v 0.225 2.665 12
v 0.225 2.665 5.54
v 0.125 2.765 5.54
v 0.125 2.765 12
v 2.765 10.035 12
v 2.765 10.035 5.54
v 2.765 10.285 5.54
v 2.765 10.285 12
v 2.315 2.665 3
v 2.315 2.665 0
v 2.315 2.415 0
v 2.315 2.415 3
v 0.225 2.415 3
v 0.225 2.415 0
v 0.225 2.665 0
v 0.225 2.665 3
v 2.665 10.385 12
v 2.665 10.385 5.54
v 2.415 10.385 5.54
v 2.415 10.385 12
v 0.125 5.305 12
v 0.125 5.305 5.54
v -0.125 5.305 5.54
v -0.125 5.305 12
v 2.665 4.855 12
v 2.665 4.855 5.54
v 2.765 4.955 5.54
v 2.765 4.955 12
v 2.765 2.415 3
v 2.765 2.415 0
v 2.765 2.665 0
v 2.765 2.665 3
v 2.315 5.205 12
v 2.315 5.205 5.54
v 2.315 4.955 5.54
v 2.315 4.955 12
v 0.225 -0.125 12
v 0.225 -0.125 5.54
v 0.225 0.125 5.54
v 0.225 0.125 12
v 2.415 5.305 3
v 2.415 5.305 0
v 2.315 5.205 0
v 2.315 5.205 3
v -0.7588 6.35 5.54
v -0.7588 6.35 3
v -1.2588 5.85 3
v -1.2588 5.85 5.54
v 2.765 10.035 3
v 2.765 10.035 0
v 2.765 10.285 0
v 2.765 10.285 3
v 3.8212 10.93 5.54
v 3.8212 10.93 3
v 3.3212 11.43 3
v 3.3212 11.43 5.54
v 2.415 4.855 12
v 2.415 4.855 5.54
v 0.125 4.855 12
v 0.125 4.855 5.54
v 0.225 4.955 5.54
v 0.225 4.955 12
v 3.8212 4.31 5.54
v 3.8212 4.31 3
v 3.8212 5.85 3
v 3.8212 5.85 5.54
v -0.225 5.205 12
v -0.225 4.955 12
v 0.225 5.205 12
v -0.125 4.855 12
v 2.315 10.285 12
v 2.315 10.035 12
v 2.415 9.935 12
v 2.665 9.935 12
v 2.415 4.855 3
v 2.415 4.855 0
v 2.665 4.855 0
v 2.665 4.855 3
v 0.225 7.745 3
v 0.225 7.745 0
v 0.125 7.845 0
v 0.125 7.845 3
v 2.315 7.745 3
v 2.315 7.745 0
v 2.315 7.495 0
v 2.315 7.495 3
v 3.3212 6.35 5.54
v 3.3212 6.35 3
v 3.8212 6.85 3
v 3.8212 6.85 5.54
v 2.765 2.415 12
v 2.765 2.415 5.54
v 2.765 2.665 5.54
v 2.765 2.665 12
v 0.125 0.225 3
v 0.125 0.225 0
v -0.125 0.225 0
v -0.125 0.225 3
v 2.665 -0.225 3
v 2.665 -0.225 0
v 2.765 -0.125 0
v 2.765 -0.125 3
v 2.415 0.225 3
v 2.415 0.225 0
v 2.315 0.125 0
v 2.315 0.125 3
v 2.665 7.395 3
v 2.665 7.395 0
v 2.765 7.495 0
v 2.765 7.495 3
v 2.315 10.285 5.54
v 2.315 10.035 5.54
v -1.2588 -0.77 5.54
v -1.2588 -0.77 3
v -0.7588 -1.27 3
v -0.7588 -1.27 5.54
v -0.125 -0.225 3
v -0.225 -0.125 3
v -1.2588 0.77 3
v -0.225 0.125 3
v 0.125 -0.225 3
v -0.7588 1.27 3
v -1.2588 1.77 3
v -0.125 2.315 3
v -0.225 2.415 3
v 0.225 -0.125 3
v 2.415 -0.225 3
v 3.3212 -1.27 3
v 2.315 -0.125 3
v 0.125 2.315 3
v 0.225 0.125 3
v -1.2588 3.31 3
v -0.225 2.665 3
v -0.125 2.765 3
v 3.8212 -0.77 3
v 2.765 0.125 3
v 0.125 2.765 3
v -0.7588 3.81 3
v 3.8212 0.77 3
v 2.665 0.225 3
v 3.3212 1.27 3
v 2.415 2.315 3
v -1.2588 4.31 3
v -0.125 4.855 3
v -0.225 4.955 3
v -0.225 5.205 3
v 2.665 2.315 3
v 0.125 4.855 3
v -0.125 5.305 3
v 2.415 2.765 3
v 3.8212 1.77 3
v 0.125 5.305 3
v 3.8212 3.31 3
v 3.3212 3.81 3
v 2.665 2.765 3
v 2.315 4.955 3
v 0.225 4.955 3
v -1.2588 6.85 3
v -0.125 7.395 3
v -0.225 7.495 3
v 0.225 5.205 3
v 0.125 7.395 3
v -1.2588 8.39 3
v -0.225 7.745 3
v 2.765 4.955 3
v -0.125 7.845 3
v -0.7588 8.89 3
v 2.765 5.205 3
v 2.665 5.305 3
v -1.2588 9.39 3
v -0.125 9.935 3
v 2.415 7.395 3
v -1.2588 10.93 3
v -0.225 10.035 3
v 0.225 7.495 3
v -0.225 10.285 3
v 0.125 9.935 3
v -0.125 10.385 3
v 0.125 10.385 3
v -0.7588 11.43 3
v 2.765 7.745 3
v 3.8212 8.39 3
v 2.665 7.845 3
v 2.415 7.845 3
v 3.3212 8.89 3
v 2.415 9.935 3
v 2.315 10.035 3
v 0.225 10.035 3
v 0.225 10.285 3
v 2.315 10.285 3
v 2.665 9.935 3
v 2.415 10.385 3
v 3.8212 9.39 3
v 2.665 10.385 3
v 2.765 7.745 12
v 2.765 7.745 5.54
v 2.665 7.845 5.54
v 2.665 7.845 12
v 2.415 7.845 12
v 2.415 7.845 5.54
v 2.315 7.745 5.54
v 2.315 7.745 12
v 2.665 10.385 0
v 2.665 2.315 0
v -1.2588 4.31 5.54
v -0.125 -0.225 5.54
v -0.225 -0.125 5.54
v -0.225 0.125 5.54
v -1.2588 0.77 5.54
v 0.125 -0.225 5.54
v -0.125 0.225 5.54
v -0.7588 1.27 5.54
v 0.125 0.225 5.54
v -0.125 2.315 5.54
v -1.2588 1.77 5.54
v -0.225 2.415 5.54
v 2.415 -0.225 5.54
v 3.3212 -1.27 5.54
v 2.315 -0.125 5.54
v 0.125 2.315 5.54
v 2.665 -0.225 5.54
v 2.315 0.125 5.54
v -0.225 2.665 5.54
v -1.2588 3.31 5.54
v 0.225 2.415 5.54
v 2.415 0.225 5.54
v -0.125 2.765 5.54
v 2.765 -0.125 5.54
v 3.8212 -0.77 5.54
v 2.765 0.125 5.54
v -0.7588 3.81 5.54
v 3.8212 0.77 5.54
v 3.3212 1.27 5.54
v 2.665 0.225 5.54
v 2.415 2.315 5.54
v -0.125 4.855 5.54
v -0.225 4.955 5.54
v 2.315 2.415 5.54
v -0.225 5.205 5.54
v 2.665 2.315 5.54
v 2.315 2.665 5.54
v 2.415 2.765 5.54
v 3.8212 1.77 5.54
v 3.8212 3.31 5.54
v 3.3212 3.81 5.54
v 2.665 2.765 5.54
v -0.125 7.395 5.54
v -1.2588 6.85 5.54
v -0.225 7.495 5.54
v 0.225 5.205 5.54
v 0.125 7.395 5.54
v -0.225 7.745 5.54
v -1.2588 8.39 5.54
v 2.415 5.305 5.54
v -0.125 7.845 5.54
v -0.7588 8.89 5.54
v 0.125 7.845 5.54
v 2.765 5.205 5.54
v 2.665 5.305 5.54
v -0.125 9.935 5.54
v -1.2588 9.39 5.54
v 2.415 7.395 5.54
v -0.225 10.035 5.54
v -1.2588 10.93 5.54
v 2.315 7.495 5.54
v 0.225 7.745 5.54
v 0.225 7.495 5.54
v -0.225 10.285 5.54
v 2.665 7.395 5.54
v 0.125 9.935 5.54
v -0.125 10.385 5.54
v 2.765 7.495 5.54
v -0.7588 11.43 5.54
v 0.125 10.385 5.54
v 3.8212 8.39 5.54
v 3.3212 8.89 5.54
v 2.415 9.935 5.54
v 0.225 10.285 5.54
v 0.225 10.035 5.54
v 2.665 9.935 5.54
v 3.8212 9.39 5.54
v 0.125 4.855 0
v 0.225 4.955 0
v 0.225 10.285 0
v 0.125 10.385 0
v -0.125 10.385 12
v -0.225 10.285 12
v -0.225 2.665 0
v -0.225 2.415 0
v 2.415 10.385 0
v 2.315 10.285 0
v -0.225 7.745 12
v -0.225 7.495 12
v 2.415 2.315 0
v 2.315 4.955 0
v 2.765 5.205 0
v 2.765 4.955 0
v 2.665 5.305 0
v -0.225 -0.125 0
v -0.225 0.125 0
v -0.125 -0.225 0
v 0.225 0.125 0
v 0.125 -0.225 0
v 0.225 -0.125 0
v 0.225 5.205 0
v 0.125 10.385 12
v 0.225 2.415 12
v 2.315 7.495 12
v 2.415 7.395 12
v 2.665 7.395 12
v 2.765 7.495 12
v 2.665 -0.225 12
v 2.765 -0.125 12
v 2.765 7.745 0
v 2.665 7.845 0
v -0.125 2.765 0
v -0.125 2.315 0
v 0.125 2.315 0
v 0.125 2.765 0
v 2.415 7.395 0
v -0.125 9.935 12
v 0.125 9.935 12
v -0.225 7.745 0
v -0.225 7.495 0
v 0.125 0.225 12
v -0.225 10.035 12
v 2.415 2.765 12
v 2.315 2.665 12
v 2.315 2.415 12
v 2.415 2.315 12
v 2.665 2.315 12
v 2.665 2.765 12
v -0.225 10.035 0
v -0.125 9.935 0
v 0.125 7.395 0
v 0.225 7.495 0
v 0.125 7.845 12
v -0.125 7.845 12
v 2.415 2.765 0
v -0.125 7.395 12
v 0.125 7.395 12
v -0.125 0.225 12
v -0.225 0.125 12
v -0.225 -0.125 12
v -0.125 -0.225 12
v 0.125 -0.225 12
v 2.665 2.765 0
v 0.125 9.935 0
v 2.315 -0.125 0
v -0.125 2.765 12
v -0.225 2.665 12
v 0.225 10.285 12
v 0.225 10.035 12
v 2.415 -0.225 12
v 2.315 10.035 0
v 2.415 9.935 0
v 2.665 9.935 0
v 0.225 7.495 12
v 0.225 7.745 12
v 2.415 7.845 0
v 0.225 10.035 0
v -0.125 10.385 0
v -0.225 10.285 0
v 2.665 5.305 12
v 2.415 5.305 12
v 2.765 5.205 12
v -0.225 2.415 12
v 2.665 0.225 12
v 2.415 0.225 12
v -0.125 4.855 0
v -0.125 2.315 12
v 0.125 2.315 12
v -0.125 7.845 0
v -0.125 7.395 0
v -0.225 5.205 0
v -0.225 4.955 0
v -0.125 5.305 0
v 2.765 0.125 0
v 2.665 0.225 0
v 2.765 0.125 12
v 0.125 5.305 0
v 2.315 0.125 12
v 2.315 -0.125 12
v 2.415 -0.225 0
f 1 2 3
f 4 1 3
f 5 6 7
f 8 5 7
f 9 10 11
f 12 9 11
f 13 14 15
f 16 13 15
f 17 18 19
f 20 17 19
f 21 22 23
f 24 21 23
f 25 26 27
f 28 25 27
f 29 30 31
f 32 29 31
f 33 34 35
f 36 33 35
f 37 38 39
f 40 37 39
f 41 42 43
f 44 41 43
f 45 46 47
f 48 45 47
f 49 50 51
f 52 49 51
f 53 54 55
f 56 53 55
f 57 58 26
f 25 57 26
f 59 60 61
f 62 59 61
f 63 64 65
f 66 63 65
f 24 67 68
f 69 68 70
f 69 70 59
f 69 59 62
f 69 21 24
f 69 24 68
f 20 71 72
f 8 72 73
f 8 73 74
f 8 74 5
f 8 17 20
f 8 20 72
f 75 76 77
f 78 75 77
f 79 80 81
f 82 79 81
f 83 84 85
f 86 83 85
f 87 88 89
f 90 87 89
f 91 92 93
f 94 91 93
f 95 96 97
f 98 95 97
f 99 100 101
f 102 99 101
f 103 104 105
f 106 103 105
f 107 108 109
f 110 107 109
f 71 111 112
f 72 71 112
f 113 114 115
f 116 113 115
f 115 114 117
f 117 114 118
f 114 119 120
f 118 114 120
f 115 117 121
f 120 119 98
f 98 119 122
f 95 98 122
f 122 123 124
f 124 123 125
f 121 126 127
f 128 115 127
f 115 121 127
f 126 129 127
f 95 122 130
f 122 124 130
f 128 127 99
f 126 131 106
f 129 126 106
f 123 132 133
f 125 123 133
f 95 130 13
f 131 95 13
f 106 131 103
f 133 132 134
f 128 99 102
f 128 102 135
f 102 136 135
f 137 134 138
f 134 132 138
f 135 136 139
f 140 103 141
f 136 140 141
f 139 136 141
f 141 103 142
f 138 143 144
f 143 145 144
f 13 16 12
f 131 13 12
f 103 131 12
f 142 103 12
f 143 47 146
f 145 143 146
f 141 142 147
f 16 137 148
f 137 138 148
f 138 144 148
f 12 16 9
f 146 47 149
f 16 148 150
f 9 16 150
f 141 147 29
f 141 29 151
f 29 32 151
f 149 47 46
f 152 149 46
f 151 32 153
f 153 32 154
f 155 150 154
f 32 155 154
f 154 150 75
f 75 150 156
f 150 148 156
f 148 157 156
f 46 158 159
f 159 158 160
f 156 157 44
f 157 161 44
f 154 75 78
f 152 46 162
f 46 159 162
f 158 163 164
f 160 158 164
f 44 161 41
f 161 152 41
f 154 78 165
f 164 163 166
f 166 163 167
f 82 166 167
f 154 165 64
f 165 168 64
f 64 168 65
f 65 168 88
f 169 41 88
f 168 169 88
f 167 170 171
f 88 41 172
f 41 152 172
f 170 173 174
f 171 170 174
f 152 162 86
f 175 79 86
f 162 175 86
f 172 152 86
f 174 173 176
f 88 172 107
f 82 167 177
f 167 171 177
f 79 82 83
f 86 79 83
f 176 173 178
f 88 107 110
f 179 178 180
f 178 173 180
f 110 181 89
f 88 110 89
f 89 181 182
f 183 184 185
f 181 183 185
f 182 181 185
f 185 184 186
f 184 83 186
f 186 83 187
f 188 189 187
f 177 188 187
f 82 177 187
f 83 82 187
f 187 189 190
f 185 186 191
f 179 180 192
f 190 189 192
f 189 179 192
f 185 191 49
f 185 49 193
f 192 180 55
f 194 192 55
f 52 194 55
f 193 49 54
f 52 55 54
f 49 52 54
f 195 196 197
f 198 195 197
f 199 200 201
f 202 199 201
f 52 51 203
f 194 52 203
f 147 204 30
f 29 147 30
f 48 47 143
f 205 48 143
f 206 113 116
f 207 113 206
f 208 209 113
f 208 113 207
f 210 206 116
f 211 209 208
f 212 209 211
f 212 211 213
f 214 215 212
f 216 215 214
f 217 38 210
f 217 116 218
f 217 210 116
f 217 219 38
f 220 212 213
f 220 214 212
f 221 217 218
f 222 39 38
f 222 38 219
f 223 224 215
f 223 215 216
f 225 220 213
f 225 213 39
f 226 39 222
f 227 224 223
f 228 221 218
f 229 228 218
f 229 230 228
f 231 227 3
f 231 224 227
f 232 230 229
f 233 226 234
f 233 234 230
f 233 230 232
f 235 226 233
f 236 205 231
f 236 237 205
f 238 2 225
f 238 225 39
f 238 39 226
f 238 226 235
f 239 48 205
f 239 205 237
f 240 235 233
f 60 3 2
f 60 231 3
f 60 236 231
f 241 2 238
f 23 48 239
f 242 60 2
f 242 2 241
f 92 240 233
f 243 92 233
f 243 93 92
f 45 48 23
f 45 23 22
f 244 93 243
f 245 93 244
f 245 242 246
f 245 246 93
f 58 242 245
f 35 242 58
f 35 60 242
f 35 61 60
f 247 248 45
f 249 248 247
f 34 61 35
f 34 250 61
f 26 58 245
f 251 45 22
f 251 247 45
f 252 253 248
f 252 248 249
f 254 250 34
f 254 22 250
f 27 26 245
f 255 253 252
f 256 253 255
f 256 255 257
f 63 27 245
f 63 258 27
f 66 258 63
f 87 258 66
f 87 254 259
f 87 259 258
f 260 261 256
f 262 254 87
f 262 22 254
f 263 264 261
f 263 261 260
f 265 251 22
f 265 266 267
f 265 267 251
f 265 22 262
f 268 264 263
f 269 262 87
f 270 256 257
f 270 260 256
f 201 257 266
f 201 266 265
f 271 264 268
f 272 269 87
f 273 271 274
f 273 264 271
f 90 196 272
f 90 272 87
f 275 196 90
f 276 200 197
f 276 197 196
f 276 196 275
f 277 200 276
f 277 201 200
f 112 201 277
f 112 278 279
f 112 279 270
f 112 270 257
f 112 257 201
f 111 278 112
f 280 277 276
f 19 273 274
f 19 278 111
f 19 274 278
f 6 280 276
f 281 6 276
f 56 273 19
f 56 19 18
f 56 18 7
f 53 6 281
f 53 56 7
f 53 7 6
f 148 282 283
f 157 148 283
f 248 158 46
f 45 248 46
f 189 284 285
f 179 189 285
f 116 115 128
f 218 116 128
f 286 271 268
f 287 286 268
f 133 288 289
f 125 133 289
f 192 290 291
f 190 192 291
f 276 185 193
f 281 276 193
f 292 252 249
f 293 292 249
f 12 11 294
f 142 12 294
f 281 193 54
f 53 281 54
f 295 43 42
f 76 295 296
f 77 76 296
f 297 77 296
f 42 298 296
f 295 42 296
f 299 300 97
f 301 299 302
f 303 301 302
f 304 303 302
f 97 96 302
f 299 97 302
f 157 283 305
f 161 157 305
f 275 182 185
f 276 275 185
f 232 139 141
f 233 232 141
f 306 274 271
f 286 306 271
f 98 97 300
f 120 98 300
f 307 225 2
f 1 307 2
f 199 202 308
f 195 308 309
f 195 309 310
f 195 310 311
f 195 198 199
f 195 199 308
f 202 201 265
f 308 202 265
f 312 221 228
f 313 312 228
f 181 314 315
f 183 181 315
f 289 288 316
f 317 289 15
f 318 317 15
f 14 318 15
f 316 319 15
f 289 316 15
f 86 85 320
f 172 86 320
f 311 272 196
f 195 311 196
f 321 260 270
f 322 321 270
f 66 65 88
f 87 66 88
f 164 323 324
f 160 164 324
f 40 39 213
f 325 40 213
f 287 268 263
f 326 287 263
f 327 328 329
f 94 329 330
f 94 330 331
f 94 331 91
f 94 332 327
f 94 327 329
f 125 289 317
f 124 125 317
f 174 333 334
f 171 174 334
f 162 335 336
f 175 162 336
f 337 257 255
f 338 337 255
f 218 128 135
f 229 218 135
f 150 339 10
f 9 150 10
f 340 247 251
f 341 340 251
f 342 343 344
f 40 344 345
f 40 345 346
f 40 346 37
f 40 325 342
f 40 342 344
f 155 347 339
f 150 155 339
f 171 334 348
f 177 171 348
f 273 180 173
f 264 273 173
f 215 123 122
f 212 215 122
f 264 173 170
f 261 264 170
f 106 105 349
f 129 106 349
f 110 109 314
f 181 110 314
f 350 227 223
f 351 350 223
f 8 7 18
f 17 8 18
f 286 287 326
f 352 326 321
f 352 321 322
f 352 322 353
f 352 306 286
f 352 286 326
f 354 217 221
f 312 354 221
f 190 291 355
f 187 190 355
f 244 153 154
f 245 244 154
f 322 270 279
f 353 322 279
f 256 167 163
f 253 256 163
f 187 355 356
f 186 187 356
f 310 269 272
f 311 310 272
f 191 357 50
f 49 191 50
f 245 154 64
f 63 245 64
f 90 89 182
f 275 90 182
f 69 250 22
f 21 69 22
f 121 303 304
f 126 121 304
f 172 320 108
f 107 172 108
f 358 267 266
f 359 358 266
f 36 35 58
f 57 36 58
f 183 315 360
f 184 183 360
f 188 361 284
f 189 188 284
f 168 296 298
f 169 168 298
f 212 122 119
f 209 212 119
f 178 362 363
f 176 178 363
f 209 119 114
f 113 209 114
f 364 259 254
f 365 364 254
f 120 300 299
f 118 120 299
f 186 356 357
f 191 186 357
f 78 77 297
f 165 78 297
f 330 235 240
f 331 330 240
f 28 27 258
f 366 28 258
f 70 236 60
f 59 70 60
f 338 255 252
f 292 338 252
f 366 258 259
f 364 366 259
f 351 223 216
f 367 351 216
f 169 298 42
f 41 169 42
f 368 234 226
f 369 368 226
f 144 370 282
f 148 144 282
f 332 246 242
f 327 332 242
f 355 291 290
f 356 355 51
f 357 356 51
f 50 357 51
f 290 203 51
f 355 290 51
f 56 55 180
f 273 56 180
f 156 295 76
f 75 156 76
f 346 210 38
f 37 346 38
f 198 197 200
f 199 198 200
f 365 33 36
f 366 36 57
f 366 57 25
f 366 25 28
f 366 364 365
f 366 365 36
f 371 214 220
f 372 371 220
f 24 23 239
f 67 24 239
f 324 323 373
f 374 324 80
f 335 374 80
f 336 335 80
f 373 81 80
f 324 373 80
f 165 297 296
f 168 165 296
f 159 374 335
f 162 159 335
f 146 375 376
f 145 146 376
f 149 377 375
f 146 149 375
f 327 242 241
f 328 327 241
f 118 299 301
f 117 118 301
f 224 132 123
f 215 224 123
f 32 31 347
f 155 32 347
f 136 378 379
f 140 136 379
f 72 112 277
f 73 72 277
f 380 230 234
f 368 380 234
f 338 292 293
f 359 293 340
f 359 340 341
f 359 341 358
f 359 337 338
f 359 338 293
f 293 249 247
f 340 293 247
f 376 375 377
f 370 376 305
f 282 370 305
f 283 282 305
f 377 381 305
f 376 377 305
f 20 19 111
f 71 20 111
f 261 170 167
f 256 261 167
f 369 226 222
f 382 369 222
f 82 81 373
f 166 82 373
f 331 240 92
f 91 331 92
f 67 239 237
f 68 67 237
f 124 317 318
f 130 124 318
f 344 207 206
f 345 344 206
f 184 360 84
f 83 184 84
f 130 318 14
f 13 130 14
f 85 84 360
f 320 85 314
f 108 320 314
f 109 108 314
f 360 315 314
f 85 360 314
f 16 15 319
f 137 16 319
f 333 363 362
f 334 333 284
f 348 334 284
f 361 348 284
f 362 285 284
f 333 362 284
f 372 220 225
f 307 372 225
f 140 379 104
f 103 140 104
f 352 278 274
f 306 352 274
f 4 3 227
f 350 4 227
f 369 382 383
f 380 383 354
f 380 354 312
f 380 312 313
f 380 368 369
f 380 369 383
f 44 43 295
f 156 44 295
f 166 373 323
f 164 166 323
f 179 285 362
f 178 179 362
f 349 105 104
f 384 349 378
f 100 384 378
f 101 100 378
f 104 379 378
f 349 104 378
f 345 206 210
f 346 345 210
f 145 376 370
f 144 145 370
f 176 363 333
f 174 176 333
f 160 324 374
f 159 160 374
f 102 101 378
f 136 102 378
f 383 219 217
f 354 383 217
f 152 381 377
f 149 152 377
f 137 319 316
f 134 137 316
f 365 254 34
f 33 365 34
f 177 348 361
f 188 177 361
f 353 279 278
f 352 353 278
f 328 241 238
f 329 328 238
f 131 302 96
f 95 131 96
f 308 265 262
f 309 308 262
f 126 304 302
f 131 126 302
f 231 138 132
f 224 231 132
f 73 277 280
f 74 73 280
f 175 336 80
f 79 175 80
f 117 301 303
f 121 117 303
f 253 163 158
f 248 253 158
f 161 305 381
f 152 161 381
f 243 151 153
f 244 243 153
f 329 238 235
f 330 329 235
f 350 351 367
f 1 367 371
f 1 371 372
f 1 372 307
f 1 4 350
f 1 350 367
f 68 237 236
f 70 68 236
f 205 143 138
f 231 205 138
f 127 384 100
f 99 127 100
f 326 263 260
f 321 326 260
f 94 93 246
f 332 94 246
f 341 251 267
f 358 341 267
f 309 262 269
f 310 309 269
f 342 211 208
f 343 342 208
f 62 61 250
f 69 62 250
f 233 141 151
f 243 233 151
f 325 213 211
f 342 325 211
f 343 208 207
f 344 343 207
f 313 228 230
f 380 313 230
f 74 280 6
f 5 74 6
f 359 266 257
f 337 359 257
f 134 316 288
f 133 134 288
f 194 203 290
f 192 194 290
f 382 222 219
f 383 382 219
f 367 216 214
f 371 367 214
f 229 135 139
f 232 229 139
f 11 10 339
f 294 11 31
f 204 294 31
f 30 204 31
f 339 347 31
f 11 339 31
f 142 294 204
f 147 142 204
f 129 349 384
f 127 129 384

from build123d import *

# Parameters (mm, degrees)
BOSS_EXTRUDE1_DEPTH = 12
LPATTERN1_COUNT     = 2
LPATTERN1_PITCH     = 2.54
BOSS_EXTRUDE2_DEPTH = 2.54
LPATTERN2_COUNT     = 5
LPATTERN2_PITCH     = 2.54


with BuildPart() as part:
    # Sketch1 → Boss-Extrude1 (new body)
    with BuildSketch(Plane.XY):
        Polygon((-0.125, 0.225), (-0.225, 0.125), (-0.225, -0.125), (-0.125, -0.225), (0.125, -0.225), (0.225, -0.125), (0.225, 0.125), (0.125, 0.225), align=None)
    extrude(amount=BOSS_EXTRUDE1_DEPTH)


with BuildPart() as lpattern1_1:
    # LPattern1: pattern copy
    add(part.part.moved(Location(Vector(1, 0, 0) * (1 * LPATTERN1_PITCH))))


with BuildPart() as part_1:
    add(part.part)

    add(lpattern1_1.part)  # Boss-Extrude2 merges LPattern1_1
    # Sketch3 → Boss-Extrude2 (add)
    with BuildSketch(Plane(origin=(0, 0, 3), x_dir=(-1, 0, 0), z_dir=(0, 0, -1))):
        Polygon((-3.321218719, -1.27), (-3.821218719, -0.77), (-3.821218719, 0.77), (-3.321218719, 1.27), (0.758781281, 1.27), (1.258781281, 0.77), (1.258781281, -0.77), (0.758781281, -1.27), align=None)
    extrude(amount=-BOSS_EXTRUDE2_DEPTH)


with BuildPart() as lpattern2_1:
    # LPattern2: pattern copy
    add(part_1.part.moved(Location(Vector(0, 1, 0) * (1 * LPATTERN2_PITCH))))


with BuildPart() as lpattern2_2:
    # LPattern2: pattern copy
    add(part_1.part.moved(Location(Vector(0, 1, 0) * (2 * LPATTERN2_PITCH))))


with BuildPart() as lpattern2_3:
    # LPattern2: pattern copy
    add(part_1.part.moved(Location(Vector(0, 1, 0) * (3 * LPATTERN2_PITCH))))


with BuildPart() as lpattern2_4:
    # LPattern2: pattern copy
    add(part_1.part.moved(Location(Vector(0, 1, 0) * (4 * LPATTERN2_PITCH))))


with BuildPart() as part_2:
    add(part_1.part)

    # Combine1: union LPattern2_1, LPattern2_2, LPattern2_3, LPattern2_4
    add(lpattern2_1.part)
    add(lpattern2_2.part)
    add(lpattern2_3.part)
    add(lpattern2_4.part)


solid = part_2.part
